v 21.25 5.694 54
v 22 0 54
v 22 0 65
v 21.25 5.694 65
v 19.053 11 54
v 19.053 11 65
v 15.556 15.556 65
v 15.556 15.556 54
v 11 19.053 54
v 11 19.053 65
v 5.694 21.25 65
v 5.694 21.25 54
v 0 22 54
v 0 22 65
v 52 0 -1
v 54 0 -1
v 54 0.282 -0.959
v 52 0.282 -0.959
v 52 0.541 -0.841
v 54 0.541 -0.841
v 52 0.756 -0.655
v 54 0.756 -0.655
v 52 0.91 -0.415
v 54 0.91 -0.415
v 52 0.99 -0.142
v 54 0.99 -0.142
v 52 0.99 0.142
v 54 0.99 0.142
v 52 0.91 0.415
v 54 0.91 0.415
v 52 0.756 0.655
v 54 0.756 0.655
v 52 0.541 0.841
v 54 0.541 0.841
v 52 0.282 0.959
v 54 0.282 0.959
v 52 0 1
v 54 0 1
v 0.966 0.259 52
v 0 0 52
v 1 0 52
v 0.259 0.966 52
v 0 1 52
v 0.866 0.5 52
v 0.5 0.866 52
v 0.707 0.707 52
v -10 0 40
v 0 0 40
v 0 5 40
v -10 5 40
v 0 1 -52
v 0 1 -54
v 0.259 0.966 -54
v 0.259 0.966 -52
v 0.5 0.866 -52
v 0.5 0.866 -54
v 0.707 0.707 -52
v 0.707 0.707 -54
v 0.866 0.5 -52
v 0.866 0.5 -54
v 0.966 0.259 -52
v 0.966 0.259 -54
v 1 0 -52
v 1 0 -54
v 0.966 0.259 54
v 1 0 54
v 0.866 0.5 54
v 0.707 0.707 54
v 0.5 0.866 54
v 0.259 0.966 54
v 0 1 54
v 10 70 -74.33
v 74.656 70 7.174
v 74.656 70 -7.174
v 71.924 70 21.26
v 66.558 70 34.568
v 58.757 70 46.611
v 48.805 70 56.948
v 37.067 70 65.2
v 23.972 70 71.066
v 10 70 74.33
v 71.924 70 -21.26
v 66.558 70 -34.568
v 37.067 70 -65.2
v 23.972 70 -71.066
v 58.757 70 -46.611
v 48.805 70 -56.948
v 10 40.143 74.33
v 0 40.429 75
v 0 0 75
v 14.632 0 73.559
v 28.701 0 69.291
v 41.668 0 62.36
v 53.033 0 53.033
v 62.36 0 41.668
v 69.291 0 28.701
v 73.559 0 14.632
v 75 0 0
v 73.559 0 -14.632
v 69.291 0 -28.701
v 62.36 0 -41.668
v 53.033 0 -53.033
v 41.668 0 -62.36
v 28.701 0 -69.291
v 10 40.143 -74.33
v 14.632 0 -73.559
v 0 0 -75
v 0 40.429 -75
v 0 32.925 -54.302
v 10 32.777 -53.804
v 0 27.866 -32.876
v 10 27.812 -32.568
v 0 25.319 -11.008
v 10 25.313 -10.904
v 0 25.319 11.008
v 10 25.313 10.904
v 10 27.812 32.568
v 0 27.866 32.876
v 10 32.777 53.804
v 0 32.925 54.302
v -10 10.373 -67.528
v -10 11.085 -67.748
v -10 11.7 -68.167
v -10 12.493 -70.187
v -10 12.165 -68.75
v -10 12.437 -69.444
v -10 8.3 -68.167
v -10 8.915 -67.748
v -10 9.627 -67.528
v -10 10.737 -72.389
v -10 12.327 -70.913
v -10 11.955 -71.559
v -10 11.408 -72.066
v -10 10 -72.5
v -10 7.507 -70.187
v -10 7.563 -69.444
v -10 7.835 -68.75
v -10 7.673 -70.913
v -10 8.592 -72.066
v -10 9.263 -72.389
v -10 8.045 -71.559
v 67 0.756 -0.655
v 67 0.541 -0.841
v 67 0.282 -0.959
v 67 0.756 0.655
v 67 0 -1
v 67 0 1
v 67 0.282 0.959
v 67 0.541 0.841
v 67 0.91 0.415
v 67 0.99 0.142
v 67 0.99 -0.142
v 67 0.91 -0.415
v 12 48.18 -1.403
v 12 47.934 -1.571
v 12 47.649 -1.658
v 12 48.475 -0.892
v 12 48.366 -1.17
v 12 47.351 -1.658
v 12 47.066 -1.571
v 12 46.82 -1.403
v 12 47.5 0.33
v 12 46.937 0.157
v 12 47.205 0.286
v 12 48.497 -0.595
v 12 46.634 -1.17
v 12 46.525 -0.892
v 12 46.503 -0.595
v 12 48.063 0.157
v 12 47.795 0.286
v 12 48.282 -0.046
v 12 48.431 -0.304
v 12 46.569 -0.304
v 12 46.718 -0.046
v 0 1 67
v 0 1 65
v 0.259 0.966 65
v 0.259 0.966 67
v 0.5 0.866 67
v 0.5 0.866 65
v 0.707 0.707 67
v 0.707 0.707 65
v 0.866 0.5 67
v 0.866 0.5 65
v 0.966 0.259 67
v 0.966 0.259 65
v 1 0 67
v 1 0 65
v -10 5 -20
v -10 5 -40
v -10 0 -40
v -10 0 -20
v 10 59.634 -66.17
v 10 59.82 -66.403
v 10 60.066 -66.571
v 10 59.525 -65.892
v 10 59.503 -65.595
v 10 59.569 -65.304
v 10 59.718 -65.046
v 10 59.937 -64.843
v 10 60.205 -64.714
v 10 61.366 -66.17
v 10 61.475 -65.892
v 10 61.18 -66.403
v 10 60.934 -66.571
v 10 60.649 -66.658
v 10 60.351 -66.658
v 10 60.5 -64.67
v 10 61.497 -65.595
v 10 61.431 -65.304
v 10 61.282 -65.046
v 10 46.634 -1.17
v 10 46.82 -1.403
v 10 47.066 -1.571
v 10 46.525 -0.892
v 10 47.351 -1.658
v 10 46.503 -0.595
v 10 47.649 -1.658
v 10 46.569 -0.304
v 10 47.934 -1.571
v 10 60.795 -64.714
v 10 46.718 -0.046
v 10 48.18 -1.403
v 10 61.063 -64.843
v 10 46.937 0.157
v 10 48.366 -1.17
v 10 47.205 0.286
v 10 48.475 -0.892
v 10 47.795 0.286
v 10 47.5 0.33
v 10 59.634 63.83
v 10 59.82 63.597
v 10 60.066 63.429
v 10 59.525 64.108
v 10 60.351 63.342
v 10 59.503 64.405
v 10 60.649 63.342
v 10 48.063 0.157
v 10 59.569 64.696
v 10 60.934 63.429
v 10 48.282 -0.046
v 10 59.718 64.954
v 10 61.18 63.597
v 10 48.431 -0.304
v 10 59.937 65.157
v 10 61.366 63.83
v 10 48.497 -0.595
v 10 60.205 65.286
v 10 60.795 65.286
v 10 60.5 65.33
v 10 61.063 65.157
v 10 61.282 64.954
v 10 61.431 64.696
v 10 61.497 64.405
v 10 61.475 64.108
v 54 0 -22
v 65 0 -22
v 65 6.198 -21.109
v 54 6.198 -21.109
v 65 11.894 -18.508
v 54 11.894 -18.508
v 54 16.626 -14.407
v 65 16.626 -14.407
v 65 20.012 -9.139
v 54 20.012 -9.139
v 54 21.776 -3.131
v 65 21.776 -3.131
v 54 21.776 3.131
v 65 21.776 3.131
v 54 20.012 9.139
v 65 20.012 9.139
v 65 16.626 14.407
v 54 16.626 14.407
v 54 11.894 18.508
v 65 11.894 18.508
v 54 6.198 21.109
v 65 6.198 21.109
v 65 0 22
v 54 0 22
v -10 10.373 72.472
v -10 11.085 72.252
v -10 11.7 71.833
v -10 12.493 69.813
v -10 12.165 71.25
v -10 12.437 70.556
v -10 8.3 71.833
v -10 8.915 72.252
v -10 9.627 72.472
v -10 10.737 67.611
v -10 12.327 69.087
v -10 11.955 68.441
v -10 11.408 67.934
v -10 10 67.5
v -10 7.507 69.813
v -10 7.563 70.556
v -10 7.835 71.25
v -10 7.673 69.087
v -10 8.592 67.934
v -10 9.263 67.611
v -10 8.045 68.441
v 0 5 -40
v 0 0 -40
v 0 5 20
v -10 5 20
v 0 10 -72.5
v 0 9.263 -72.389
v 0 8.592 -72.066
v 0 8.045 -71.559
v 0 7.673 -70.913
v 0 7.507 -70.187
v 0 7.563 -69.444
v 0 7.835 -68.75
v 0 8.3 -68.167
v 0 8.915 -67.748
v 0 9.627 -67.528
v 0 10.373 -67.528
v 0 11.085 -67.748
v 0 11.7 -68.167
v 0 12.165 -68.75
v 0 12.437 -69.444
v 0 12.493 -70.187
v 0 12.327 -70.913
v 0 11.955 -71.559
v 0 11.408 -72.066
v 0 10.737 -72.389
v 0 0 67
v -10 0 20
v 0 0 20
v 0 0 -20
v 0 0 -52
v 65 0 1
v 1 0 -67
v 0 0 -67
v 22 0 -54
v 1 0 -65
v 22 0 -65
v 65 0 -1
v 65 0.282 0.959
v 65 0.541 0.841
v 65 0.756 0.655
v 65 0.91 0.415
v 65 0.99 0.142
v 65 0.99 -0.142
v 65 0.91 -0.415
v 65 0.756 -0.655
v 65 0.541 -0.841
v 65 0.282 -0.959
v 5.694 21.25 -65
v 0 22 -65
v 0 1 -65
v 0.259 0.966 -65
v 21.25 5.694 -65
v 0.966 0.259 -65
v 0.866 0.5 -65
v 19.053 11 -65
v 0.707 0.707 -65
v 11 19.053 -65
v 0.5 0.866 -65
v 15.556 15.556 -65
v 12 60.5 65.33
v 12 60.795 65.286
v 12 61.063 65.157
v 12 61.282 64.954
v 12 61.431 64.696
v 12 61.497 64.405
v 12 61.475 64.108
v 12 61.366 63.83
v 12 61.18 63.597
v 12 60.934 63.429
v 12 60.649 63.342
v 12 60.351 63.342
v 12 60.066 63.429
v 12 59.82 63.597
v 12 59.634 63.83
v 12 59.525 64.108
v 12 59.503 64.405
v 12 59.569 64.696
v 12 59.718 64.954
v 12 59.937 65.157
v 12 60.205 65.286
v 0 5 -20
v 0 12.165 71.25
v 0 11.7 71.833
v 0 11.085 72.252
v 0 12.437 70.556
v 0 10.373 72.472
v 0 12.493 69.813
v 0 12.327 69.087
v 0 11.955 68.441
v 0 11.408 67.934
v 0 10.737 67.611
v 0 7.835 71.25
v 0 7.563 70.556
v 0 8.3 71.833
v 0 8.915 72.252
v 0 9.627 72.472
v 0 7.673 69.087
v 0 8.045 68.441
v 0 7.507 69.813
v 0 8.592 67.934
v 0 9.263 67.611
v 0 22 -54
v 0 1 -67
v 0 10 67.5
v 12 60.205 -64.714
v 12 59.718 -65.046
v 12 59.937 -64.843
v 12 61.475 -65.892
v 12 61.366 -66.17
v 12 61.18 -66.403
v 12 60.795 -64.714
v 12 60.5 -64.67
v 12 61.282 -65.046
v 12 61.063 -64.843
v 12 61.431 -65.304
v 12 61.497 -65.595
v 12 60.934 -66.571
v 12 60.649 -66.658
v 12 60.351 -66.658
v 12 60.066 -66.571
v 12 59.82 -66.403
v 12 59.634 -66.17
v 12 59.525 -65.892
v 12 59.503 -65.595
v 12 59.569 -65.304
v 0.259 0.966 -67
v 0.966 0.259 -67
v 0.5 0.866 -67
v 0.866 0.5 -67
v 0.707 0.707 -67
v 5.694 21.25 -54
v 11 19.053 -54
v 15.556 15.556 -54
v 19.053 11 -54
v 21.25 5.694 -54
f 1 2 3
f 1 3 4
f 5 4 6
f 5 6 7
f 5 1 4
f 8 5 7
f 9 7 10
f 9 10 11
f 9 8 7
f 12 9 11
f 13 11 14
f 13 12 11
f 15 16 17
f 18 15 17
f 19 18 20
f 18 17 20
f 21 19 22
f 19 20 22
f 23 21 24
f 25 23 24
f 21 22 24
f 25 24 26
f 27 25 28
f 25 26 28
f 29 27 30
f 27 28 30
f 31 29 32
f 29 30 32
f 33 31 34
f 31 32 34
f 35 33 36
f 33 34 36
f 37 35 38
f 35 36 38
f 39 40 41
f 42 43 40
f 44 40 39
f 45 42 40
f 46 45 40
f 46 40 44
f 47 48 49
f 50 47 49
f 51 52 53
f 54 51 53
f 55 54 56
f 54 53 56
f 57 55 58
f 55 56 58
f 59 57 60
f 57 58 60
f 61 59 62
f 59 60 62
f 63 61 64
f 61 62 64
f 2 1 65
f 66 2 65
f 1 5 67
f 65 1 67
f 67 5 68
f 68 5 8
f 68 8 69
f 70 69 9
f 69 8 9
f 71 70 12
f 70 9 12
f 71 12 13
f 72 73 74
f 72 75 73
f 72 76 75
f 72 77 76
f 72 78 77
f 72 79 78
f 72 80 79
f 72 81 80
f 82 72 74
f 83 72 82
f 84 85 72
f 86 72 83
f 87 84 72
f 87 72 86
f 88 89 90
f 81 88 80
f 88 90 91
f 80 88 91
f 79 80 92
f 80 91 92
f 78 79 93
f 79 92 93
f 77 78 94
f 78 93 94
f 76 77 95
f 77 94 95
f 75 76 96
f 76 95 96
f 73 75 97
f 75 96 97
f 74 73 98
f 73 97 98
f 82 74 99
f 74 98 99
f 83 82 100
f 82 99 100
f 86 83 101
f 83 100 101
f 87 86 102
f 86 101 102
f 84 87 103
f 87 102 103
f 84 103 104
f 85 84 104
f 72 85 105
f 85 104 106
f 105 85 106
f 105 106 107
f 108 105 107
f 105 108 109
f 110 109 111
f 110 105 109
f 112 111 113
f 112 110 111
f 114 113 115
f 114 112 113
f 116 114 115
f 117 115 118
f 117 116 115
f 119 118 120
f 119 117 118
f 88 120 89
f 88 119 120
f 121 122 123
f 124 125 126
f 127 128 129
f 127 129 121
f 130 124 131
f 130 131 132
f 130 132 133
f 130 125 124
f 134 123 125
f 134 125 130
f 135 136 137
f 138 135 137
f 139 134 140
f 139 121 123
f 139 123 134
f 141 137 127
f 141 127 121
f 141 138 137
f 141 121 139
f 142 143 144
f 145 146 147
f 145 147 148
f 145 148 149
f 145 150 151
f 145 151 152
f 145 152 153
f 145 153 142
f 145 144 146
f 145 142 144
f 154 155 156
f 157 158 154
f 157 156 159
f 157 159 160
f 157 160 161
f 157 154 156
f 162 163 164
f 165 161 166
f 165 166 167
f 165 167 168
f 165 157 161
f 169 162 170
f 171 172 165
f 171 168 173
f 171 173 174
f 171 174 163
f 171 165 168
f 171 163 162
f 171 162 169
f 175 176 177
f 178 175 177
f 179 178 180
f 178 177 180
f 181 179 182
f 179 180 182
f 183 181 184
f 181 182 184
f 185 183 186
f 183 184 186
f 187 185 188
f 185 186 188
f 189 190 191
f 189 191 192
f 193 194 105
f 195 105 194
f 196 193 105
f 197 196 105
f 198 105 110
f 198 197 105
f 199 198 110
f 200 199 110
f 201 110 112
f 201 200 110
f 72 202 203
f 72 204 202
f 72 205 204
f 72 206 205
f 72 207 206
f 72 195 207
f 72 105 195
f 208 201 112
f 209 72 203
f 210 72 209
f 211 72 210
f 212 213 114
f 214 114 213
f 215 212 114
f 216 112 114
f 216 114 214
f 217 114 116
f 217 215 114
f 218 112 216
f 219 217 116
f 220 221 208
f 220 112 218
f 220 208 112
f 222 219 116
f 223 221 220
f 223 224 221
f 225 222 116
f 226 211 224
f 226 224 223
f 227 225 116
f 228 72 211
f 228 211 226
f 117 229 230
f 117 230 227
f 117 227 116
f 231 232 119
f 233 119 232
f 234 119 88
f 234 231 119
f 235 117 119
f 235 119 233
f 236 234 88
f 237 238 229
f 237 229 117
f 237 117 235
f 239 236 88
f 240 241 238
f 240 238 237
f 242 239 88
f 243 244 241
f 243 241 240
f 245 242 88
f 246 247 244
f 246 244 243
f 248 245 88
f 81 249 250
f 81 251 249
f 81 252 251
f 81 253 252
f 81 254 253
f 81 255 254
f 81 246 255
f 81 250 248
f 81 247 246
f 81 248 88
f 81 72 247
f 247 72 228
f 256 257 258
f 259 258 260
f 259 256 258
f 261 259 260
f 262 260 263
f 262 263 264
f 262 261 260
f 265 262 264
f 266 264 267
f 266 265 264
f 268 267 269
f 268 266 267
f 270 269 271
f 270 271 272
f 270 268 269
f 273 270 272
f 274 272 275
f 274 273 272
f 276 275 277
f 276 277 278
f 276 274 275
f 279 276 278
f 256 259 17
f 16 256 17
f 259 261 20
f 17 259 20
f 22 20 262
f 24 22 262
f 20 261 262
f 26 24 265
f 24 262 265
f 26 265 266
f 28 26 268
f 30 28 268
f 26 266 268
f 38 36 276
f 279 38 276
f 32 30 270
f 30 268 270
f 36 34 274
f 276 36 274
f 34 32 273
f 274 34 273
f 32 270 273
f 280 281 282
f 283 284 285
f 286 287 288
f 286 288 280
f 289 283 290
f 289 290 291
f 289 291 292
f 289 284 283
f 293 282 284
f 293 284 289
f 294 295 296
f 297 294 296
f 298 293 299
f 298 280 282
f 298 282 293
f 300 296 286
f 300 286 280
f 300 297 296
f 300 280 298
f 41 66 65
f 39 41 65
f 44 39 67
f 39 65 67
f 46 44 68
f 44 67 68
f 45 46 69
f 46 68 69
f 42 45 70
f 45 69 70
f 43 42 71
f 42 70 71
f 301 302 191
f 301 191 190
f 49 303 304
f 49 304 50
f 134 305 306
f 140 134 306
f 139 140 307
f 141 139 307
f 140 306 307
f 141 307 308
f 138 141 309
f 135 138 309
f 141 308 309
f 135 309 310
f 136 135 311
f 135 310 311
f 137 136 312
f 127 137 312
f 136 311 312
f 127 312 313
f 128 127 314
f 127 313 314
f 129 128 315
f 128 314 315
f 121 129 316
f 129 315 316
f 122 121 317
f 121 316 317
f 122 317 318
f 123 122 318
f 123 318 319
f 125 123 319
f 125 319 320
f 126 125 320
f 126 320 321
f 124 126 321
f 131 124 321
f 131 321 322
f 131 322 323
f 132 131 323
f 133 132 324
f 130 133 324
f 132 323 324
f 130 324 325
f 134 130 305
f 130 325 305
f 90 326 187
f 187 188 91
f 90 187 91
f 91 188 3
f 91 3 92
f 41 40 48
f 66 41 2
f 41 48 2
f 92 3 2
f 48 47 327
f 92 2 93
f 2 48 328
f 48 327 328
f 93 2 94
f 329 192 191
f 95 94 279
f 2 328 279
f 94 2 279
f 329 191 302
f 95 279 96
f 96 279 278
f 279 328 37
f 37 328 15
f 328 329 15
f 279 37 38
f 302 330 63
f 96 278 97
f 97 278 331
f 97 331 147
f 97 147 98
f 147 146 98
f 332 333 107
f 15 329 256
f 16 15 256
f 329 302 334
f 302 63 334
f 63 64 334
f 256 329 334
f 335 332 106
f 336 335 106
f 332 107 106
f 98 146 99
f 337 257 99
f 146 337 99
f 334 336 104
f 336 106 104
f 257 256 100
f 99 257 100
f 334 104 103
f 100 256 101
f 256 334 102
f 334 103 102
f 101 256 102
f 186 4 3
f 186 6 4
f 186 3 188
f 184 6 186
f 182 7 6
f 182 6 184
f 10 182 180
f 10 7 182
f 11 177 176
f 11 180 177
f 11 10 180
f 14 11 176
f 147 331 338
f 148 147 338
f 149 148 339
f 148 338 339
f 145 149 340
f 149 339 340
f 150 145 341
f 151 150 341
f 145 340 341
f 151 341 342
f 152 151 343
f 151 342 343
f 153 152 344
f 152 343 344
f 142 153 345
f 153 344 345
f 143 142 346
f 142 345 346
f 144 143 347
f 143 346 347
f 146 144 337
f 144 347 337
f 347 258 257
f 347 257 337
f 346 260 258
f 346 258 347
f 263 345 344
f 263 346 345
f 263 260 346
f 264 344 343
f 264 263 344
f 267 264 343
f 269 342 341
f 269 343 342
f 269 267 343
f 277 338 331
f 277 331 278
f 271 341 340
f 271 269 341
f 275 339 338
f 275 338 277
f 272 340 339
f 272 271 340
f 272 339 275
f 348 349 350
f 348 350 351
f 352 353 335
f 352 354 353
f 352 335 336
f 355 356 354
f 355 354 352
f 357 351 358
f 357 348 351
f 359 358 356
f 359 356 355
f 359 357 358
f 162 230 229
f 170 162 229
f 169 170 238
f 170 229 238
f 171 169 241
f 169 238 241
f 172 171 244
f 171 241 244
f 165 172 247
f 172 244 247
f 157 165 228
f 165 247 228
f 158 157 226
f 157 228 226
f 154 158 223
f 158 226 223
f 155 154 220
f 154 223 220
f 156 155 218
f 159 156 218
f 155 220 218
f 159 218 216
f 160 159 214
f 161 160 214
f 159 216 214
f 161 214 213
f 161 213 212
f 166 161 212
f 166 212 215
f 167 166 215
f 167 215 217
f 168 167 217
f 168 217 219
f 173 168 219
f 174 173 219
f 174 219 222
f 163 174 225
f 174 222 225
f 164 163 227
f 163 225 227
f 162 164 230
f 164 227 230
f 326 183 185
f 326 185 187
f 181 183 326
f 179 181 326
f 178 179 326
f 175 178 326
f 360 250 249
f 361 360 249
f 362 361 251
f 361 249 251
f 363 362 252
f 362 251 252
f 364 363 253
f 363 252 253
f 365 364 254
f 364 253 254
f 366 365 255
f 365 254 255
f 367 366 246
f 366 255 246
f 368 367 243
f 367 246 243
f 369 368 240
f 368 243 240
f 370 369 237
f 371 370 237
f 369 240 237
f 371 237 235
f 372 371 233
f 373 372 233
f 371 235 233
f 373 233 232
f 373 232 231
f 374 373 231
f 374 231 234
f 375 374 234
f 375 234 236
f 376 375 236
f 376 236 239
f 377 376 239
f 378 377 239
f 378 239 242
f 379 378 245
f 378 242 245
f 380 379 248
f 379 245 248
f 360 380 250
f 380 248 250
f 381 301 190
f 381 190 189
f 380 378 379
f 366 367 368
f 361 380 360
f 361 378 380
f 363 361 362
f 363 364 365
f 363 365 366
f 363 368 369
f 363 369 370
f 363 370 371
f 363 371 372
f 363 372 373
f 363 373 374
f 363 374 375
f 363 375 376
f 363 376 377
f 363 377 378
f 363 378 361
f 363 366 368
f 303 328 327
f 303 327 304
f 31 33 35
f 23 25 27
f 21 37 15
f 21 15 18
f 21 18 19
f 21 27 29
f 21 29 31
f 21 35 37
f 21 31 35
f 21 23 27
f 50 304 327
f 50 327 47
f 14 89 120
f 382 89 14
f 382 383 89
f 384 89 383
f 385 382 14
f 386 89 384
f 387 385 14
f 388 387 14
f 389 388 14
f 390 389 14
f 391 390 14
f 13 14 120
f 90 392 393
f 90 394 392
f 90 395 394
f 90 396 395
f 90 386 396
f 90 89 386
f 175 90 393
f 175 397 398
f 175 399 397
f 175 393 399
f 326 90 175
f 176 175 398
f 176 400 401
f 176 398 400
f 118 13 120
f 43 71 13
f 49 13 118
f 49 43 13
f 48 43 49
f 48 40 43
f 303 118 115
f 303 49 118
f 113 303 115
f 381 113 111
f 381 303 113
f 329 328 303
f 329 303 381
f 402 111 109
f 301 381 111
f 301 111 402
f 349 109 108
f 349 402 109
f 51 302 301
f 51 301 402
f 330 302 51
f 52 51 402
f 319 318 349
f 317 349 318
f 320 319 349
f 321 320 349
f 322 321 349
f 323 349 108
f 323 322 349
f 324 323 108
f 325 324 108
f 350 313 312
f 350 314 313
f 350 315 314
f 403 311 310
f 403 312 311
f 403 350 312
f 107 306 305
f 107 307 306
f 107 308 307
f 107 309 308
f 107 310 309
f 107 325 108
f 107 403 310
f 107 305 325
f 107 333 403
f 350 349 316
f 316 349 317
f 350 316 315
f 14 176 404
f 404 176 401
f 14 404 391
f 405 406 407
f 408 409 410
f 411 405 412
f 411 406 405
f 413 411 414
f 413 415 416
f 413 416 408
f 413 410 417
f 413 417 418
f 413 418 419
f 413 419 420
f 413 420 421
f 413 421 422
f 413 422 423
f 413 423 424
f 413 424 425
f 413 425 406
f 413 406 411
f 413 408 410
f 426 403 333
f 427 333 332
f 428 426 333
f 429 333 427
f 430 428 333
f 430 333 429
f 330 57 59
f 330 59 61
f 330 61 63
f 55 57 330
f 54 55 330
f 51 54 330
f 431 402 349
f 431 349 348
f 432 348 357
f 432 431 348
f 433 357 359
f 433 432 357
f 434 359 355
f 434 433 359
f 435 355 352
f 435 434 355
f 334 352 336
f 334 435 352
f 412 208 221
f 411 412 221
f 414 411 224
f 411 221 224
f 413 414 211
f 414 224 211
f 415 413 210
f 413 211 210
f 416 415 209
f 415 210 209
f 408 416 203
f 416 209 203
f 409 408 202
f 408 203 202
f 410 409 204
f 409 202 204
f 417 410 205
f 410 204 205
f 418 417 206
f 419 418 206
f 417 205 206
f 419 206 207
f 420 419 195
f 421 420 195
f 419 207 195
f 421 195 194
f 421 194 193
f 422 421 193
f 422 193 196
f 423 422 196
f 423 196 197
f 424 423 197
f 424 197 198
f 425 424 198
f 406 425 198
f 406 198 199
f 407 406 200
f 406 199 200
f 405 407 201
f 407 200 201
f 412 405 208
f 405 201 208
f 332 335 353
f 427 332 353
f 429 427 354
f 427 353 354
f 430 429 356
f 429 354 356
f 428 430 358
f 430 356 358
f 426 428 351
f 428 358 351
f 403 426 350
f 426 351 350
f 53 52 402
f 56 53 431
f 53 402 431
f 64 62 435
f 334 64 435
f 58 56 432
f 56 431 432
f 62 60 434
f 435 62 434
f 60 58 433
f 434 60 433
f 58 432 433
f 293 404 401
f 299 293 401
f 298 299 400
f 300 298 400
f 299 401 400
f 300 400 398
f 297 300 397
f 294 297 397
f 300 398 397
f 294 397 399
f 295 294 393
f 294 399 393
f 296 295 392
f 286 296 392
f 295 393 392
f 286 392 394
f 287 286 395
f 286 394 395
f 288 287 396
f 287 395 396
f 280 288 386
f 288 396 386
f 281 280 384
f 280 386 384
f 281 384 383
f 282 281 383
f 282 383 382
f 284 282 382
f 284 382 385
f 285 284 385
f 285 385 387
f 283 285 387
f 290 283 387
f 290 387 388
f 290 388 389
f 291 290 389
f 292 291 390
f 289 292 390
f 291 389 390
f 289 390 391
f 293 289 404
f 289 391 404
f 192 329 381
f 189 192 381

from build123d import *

# Parameters (mm, degrees)
BOSS_EXTRUDE2_DEPTH = 100
SKETCH3_W           = 11
SKETCH3_H           = 22
SKETCH4_R           = 1
CUT_EXTRUDE1_DEPTH  = 2
SKETCH5_R           = 1
CUT_EXTRUDE2_DEPTH  = 2
CIRPATTERN1_COUNT   = 4
SKETCH8_R           = 2.5
SKETCH8_W           = 20
SKETCH8_H           = 5
BOSS_EXTRUDE3_DEPTH = 10
SKETCH6_W           = 10
SKETCH6_H           = 190
BOSS_EXTRUDE4_DEPTH = 115
SKETCH10_W          = 10
SKETCH10_H          = 190
SKETCH11_R          = 1
CUT_EXTRUDE3_DEPTH  = 2
SKETCH12_R          = 75
CUT_EXTRUDE4_DEPTH  = 30


with BuildPart() as part:
    # Sketch1 → Boss-Extrude2 (new body)
    with BuildSketch(Plane(origin=(0, 0, 0), x_dir=(1, 0, 0), z_dir=(0, 1, 0))):
        with BuildLine():
            ThreePointArc((75, 0), (53.033008589, 53.033008589), (0, 75))
            Line((0, 75), (0, -75))
            ThreePointArc((0, -75), (53.033008589, -53.033008589), (75, 0))
        make_face()
    extrude(amount=BOSS_EXTRUDE2_DEPTH)

    # Sketch3 → Cut-Revolve3 (revolve, cut)
    with BuildSketch(Plane(origin=(0, 0, 0), x_dir=(-1, 0, 0), z_dir=(0, -1, 0))):
        with Locations((-59.5, 11)):
            Rectangle(SKETCH3_W, SKETCH3_H)
    cut_revolve3 = revolve(axis=Axis((0, 0, 0), (1, 0, 0)), mode=Mode.SUBTRACT)

    # Sketch4 → Cut-Extrude1 (cut)
    with BuildSketch(Plane.ZY.offset(-65)):
        Circle(SKETCH4_R)
    cut_extrude1 = extrude(amount=-CUT_EXTRUDE1_DEPTH, mode=Mode.SUBTRACT)

    # Sketch5 → Cut-Extrude2 (cut)
    with BuildSketch(Plane(origin=(54, 0, 0), x_dir=(0, 0, -1), z_dir=(1, 0, 0))):
        Circle(SKETCH5_R)
    cut_extrude2 = extrude(amount=-CUT_EXTRUDE2_DEPTH, mode=Mode.SUBTRACT)

    # CirPattern1: Cut-Revolve3, Cut-Extrude1, Cut-Extrude2 ×4 about axis
    cirpattern1_axis = Axis((0, 0, 0), (0, 1, 0))
    add([cut_revolve3.rotate(cirpattern1_axis, i * 360 / CIRPATTERN1_COUNT) for i in range(1, CIRPATTERN1_COUNT)], mode=Mode.SUBTRACT)
    add([cut_extrude1.rotate(cirpattern1_axis, i * 360 / CIRPATTERN1_COUNT) for i in range(1, CIRPATTERN1_COUNT)], mode=Mode.SUBTRACT)
    add([cut_extrude2.rotate(cirpattern1_axis, i * 360 / CIRPATTERN1_COUNT) for i in range(1, CIRPATTERN1_COUNT)], mode=Mode.SUBTRACT)

    # Sketch8 → Boss-Extrude3 (add)
    with BuildSketch(Plane.ZY):
        with Locations(Location((-70, 10, 0), (0, 0, 180))):
            Circle(SKETCH8_R)
        with Locations(Location((70, 10, 0), (0, 0, 180))):
            Circle(SKETCH8_R)
        with Locations((-30, 2.5)):
            Rectangle(SKETCH8_W, SKETCH8_H)
        with Locations((30, 2.5)):
            Rectangle(SKETCH8_W, SKETCH8_H)
    extrude(amount=BOSS_EXTRUDE3_DEPTH)

    # Sketch6 → Boss-Extrude4 (add)
    with BuildSketch(Plane(origin=(0, 100, 0), x_dir=(1, 0, 0), z_dir=(0, 1, 0))):
        with Locations((5, -95)):
            Rectangle(SKETCH6_W, SKETCH6_H)
    extrude(amount=BOSS_EXTRUDE4_DEPTH)

    # Sketch10 → Cut-Revolve4 (revolve, cut)
    with BuildSketch(Plane(origin=(0, 215, 0), x_dir=(1, 0, 0), z_dir=(0, 1, 0))):
        with Locations((5, -95)):
            Rectangle(SKETCH10_W, SKETCH10_H)
    revolve(axis=Axis((10, 215, 0), (-1, 0, 0)), mode=Mode.SUBTRACT)


with BuildPart() as cut_revolve4_kept_piece:
    # of the separate pieces the step leaves, the one the design keeps (cut_revolve4_pieces_kept)
    add(part.part.solids().sort_by_distance((0, 0, 75))[0])

    # Sketch11 → Cut-Extrude3 (cut)
    with BuildSketch(Plane.ZY.offset(-10)):
        with Locations((-0.669656263, 47.5)):
            Circle(SKETCH11_R)
        with Locations((-65.669656263, 60.5)):
            Circle(SKETCH11_R)
        with Locations((64.330343737, 60.5)):
            Circle(SKETCH11_R)
    extrude(amount=-CUT_EXTRUDE3_DEPTH, mode=Mode.SUBTRACT)

    # Sketch12 → Cut-Extrude4 (cut)
    with BuildSketch(Plane(origin=(0, 100, 0), x_dir=(1, 0, 0), z_dir=(0, 1, 0))):
        Circle(SKETCH12_R)
    extrude(amount=-CUT_EXTRUDE4_DEPTH, mode=Mode.SUBTRACT)


solid = cut_revolve4_kept_piece.part
